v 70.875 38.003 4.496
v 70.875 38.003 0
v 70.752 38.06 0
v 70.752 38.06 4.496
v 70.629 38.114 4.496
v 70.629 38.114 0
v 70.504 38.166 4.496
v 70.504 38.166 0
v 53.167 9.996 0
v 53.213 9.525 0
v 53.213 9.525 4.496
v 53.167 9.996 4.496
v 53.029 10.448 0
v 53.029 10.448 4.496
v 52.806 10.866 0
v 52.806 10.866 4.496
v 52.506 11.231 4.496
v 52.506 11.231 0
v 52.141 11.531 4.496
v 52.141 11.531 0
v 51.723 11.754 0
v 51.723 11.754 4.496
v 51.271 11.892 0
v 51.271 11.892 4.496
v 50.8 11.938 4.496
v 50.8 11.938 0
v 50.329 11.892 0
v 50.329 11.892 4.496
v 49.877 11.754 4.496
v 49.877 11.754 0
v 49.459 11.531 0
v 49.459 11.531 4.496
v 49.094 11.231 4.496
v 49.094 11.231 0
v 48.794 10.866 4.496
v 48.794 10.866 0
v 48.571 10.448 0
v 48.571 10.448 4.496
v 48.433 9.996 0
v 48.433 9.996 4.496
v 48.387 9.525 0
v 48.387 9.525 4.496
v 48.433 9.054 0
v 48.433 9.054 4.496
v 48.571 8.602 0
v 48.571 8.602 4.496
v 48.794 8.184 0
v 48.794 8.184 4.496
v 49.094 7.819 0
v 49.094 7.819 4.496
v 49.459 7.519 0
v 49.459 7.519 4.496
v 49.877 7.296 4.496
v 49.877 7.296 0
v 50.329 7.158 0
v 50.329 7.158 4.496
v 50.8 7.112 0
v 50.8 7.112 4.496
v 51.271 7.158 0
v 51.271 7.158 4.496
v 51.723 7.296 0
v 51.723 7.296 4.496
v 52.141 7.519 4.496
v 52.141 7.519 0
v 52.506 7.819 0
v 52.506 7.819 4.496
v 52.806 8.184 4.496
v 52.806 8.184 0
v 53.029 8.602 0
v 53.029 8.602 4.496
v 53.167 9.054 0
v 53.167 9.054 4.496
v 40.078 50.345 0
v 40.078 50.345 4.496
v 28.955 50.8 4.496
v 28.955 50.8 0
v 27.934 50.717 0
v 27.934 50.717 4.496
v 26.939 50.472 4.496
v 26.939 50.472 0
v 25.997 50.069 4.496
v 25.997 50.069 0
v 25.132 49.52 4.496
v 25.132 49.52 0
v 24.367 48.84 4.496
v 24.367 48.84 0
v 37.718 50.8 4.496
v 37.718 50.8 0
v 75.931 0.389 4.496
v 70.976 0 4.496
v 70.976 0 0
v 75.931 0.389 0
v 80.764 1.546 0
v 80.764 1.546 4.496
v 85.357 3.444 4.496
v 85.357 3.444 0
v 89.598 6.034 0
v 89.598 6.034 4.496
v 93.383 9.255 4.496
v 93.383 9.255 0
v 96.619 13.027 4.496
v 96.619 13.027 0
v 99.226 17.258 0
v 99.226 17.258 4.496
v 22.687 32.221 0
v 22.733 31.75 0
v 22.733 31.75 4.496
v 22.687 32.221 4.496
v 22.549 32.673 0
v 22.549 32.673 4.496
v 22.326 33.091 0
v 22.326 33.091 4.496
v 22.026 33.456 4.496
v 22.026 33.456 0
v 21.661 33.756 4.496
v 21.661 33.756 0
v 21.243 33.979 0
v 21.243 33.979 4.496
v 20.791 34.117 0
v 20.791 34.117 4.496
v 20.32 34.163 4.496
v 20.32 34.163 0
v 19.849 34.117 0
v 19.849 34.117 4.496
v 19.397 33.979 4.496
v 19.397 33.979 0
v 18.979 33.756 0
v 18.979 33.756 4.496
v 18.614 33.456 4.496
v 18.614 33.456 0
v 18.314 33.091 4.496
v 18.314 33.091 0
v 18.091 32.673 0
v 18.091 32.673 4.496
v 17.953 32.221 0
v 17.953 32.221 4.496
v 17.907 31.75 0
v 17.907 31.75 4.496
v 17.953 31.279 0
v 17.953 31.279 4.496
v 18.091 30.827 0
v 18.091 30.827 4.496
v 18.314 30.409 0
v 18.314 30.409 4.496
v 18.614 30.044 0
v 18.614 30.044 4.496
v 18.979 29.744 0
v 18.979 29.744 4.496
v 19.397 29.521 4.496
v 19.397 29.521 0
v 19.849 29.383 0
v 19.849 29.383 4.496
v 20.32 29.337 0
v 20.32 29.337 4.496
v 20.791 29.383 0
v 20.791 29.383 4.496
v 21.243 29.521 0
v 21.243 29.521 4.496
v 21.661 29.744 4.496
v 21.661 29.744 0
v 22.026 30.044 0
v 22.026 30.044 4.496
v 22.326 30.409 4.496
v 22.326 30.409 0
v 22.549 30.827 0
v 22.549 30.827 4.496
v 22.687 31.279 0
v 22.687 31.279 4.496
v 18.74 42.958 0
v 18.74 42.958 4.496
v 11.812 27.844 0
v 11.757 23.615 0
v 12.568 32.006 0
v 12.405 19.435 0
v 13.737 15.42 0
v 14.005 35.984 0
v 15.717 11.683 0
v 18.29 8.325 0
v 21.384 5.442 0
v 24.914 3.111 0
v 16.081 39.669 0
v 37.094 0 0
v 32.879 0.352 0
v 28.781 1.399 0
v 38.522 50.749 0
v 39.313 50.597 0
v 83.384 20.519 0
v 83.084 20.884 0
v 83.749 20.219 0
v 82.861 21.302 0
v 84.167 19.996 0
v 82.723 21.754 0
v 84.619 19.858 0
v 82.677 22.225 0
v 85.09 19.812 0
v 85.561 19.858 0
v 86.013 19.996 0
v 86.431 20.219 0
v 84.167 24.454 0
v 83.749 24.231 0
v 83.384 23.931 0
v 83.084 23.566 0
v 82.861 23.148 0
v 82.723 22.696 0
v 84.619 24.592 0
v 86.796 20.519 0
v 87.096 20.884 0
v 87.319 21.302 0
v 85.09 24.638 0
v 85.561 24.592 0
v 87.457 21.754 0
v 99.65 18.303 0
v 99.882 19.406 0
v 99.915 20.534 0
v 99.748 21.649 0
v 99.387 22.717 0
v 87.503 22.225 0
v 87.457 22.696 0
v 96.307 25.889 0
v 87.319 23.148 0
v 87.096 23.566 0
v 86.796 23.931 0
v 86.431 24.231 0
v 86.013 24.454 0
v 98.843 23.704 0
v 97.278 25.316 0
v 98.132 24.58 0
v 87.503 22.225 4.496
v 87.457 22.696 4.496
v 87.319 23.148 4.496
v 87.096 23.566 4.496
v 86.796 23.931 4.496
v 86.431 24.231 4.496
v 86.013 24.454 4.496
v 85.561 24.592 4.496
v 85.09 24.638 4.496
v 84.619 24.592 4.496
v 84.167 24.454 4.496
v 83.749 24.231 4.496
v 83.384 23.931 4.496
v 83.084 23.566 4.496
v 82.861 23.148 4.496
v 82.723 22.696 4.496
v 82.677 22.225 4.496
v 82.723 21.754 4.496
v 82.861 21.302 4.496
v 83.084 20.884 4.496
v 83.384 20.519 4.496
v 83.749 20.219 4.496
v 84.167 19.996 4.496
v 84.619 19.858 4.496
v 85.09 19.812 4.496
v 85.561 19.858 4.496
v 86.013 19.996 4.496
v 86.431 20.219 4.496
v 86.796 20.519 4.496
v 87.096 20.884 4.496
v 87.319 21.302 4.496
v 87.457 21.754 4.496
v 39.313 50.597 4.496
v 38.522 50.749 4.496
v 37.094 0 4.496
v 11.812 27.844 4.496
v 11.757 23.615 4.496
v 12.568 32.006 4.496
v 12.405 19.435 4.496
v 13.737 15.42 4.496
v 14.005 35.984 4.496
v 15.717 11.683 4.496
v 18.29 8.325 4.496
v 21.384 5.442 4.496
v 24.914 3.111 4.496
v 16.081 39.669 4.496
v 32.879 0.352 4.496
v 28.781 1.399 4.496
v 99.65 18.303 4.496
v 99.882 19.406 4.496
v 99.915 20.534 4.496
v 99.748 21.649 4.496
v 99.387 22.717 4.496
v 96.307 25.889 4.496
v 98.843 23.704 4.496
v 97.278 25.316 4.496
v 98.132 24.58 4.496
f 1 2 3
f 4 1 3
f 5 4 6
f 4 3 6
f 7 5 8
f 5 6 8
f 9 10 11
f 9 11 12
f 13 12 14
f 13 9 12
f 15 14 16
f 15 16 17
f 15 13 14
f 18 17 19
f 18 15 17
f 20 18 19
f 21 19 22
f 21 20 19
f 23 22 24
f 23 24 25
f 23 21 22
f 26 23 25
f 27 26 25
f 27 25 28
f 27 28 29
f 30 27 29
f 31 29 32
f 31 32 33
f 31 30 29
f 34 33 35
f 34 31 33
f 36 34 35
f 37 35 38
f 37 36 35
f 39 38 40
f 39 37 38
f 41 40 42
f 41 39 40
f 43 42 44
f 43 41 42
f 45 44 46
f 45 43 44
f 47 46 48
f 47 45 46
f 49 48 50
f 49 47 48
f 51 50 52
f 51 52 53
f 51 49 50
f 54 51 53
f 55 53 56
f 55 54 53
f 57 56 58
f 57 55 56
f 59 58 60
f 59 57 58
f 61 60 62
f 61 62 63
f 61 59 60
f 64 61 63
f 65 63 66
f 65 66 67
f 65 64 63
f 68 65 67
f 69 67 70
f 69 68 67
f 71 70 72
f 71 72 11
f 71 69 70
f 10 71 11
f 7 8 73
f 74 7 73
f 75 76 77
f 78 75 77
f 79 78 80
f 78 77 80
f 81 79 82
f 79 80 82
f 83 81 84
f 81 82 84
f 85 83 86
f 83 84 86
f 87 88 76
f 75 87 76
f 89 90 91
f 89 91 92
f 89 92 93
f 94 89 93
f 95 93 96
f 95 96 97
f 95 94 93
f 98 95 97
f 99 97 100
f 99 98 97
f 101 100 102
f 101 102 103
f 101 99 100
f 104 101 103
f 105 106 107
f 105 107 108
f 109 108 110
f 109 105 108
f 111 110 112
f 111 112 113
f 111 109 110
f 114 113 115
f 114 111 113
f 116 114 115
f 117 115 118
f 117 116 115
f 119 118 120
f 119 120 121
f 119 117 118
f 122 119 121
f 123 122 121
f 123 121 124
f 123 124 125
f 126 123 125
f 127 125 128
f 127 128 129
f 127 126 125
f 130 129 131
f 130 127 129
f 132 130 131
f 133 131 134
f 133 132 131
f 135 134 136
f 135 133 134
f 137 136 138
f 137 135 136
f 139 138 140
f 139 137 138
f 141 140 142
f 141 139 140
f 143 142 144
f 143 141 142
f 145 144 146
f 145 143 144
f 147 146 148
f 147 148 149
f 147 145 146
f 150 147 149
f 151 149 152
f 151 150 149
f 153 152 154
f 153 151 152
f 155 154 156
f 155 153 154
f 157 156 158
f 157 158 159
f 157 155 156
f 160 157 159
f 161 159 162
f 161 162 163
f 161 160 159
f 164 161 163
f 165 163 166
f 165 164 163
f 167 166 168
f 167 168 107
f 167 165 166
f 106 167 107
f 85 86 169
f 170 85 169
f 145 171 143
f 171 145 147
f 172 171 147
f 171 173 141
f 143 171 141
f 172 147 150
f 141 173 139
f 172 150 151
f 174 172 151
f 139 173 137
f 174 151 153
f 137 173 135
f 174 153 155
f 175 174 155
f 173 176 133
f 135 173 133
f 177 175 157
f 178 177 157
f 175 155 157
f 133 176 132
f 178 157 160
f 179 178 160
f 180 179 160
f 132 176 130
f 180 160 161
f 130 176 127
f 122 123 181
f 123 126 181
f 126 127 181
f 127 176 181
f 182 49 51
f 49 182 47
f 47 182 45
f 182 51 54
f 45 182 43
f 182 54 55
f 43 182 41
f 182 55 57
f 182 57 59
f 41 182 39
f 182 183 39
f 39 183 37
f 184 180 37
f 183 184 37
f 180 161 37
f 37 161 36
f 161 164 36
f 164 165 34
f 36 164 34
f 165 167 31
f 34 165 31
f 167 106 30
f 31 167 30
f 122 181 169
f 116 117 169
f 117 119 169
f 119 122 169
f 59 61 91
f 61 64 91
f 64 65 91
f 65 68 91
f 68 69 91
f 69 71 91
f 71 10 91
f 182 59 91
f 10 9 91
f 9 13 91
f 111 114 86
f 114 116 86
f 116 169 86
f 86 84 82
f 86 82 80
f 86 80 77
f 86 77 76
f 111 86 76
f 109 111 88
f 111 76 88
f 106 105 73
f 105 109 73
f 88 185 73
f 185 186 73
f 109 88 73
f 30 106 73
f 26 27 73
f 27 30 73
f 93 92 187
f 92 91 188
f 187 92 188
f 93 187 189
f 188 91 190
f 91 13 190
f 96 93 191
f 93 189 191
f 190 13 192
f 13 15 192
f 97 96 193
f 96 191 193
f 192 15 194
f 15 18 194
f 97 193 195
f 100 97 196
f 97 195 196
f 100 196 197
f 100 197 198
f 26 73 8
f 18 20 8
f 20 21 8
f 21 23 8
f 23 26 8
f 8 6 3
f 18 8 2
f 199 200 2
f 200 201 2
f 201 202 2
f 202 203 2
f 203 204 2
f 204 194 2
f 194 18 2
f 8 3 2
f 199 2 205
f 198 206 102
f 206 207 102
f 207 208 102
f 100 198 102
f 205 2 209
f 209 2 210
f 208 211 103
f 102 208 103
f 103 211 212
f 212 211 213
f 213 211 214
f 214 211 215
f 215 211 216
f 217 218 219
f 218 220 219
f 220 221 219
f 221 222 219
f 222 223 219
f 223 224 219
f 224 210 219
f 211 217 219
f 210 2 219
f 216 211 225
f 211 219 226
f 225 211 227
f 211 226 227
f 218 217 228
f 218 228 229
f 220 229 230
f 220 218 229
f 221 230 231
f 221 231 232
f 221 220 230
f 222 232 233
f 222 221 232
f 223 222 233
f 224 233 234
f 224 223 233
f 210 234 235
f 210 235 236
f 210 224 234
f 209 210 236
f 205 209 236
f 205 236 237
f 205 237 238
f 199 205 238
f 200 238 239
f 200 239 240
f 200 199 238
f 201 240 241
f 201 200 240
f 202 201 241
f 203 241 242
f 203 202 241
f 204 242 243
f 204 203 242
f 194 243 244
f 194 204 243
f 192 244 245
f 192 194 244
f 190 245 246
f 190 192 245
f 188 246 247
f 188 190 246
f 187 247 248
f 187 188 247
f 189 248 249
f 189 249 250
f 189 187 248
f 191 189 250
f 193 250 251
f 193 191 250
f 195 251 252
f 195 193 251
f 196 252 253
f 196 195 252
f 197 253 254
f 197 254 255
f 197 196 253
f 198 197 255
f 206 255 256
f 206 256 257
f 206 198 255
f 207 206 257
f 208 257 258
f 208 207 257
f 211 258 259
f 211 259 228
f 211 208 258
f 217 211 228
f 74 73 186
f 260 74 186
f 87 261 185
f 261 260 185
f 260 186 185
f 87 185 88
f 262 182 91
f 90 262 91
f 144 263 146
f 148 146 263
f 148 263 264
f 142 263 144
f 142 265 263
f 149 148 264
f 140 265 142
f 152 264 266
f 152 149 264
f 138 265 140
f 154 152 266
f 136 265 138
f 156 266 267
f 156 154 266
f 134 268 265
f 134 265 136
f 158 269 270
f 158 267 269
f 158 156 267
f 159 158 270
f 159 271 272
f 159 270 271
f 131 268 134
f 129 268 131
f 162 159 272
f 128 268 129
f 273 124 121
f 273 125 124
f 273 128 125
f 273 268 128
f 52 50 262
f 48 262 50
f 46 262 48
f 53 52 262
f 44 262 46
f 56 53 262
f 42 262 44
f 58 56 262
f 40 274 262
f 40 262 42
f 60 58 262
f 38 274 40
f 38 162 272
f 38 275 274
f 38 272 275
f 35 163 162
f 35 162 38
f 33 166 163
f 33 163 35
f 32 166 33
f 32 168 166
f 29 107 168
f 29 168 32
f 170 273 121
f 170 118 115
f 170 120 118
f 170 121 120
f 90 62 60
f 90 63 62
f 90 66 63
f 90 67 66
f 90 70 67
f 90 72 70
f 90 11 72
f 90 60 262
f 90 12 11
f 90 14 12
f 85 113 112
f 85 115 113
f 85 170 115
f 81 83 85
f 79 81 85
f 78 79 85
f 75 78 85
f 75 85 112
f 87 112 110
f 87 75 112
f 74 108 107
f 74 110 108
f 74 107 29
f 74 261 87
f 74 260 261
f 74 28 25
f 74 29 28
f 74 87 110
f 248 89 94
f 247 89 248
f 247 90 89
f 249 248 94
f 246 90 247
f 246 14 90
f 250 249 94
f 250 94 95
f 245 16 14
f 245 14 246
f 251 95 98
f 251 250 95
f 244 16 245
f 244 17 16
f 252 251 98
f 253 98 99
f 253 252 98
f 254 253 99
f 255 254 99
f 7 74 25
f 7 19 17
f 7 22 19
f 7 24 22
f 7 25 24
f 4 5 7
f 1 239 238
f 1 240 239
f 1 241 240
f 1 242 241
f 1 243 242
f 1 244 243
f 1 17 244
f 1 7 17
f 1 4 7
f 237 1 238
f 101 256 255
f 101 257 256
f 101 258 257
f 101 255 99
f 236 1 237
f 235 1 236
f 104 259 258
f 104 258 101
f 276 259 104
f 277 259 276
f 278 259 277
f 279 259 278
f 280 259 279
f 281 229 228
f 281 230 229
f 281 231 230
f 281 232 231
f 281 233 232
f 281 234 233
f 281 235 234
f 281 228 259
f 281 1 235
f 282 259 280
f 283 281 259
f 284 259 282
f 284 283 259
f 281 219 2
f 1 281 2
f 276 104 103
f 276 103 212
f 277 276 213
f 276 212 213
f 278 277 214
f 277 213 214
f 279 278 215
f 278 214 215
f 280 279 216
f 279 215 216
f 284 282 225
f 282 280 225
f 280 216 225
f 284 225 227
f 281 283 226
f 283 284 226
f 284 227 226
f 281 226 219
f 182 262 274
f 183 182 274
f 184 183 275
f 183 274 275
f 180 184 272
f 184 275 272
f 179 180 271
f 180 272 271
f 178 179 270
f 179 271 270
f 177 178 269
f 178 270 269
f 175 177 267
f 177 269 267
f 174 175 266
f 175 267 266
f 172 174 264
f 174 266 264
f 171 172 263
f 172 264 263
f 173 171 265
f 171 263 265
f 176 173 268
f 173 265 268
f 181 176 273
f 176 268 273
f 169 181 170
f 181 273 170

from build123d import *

# Parameters (mm, degrees)
SKETCH1_R          = 2.413
EXTRUDE1_DEPTH     = 4.4958
CUT_EXTRUDE1_DEPTH = 114.681186736
FILLET1_R          = 6.35


with BuildPart() as part:
    # Sketch1 → Extrude1 (new body)
    with BuildSketch(Plane.XY):
        Polygon((26.2420825, 50.8), (0, 23.368), (0, 0), (101.6, 0), (101.6, 23.368), (70.6920825, 38.090460221), (38.9420825, 50.8), align=None)
        with Locations((20.32, 31.75)):
            Circle(SKETCH1_R, mode=Mode.SUBTRACT)
        with Locations((50.8, 9.525)):
            Circle(SKETCH1_R, mode=Mode.SUBTRACT)
        with Locations((85.09, 22.225)):
            Circle(SKETCH1_R, mode=Mode.SUBTRACT)
    extrude(amount=EXTRUDE1_DEPTH)

    # Sketch2 → Cut-Extrude1 (cut, through all)
    with BuildSketch(Plane.XY.offset(4.4958)):
        with BuildLine():
            Line((18.740269579, 42.958025871), (0, 23.368))
            Line((0, 23.368), (0, 0))
            Line((0, 0), (37.094444241, 0))
            ThreePointArc((37.094444241, 0), (13.737070061, 15.420367169), (18.740269579, 42.958025871))
        make_face()
        with BuildLine():
            Line((101.6, 23.368), (101.6, 0))
            Line((101.6, 0), (70.976404914, 0))
            ThreePointArc((70.976404914, 0), (90.236908542, 6.509249219), (101.6, 23.368))
        make_face()
    extrude(amount=-CUT_EXTRUDE1_DEPTH, mode=Mode.SUBTRACT)

    # Fillet1
    # the kernel refuses this fillet: 6.35 mm, written as the material it takes off along each edge
    with BuildSketch(Plane(origin=(26.2420825, 50.8, -6.782726088), x_dir=(-0.6912608610672895, -0.7226053016388058, 0), z_dir=(0, 0, 1))) as fillet1_piece_1:
        with BuildLine():
            CenterArc((FILLET1_R * 0.427258336235, FILLET1_R), FILLET1_R, 223.73, 46.27)
            Line((-FILLET1_R * 0.295346965404, FILLET1_R * 0.308739138933), (0, 0))
            Line((0, 0), (FILLET1_R * 0.427258336235, 0))
        make_face()
    extrude(amount=18.061252175, mode=Mode.SUBTRACT)
    with BuildSketch(Plane(origin=(38.9420825, 50.8, -3.059377728), x_dir=(-1, 0, 0), z_dir=(0, 0, 1))) as fillet1_piece_2:
        with BuildLine():
            CenterArc((FILLET1_R * 0.192716707281, FILLET1_R), FILLET1_R, 248.183751186, 21.816248814)
            Line((-FILLET1_R * 0.178914427547, FILLET1_R * 0.0716195286272), (0, 0))
            Line((0, 0), (FILLET1_R * 0.192716707281, 0))
        make_face()
    extrude(amount=10.614555456, mode=Mode.SUBTRACT)
    with BuildSketch(Plane(origin=(70.6920825, 38.090460221, -0.506345886), x_dir=(-0.9283804713727851, 0.3716311348281322, 0), z_dir=(0, 0, 1))) as fillet1_piece_3:
        with BuildLine():
            CenterArc((FILLET1_R * 0.0318958038441, FILLET1_R), FILLET1_R, 266.346248814, 3.653751186)
            Line((-FILLET1_R * 0.0318309718993, FILLET1_R * 0.00203261673873), (0, 0))
            Line((0, 0), (FILLET1_R * 0.0318958038441, 0))
        make_face()
    extrude(amount=5.508491772, mode=Mode.SUBTRACT)
    with BuildSketch(Plane(origin=(101.6, 23.368, -16.387317761), x_dir=(-0.9028105756982961, 0.43003844526659585, 0), z_dir=(0, 0, 1))) as fillet1_piece_4:
        with BuildLine():
            CenterArc((5.862905037, 6.35), FILLET1_R, 178.312383947, 91.687616053)
            ThreePointArc((-0.484340643, 6.537008757), (-0.411321416, 3.25597162), (0, 0))
            Line((0, 0), (5.862905037, 0))
        make_face()
    extrude(amount=37.270435521, mode=Mode.SUBTRACT)


solid = part.part
